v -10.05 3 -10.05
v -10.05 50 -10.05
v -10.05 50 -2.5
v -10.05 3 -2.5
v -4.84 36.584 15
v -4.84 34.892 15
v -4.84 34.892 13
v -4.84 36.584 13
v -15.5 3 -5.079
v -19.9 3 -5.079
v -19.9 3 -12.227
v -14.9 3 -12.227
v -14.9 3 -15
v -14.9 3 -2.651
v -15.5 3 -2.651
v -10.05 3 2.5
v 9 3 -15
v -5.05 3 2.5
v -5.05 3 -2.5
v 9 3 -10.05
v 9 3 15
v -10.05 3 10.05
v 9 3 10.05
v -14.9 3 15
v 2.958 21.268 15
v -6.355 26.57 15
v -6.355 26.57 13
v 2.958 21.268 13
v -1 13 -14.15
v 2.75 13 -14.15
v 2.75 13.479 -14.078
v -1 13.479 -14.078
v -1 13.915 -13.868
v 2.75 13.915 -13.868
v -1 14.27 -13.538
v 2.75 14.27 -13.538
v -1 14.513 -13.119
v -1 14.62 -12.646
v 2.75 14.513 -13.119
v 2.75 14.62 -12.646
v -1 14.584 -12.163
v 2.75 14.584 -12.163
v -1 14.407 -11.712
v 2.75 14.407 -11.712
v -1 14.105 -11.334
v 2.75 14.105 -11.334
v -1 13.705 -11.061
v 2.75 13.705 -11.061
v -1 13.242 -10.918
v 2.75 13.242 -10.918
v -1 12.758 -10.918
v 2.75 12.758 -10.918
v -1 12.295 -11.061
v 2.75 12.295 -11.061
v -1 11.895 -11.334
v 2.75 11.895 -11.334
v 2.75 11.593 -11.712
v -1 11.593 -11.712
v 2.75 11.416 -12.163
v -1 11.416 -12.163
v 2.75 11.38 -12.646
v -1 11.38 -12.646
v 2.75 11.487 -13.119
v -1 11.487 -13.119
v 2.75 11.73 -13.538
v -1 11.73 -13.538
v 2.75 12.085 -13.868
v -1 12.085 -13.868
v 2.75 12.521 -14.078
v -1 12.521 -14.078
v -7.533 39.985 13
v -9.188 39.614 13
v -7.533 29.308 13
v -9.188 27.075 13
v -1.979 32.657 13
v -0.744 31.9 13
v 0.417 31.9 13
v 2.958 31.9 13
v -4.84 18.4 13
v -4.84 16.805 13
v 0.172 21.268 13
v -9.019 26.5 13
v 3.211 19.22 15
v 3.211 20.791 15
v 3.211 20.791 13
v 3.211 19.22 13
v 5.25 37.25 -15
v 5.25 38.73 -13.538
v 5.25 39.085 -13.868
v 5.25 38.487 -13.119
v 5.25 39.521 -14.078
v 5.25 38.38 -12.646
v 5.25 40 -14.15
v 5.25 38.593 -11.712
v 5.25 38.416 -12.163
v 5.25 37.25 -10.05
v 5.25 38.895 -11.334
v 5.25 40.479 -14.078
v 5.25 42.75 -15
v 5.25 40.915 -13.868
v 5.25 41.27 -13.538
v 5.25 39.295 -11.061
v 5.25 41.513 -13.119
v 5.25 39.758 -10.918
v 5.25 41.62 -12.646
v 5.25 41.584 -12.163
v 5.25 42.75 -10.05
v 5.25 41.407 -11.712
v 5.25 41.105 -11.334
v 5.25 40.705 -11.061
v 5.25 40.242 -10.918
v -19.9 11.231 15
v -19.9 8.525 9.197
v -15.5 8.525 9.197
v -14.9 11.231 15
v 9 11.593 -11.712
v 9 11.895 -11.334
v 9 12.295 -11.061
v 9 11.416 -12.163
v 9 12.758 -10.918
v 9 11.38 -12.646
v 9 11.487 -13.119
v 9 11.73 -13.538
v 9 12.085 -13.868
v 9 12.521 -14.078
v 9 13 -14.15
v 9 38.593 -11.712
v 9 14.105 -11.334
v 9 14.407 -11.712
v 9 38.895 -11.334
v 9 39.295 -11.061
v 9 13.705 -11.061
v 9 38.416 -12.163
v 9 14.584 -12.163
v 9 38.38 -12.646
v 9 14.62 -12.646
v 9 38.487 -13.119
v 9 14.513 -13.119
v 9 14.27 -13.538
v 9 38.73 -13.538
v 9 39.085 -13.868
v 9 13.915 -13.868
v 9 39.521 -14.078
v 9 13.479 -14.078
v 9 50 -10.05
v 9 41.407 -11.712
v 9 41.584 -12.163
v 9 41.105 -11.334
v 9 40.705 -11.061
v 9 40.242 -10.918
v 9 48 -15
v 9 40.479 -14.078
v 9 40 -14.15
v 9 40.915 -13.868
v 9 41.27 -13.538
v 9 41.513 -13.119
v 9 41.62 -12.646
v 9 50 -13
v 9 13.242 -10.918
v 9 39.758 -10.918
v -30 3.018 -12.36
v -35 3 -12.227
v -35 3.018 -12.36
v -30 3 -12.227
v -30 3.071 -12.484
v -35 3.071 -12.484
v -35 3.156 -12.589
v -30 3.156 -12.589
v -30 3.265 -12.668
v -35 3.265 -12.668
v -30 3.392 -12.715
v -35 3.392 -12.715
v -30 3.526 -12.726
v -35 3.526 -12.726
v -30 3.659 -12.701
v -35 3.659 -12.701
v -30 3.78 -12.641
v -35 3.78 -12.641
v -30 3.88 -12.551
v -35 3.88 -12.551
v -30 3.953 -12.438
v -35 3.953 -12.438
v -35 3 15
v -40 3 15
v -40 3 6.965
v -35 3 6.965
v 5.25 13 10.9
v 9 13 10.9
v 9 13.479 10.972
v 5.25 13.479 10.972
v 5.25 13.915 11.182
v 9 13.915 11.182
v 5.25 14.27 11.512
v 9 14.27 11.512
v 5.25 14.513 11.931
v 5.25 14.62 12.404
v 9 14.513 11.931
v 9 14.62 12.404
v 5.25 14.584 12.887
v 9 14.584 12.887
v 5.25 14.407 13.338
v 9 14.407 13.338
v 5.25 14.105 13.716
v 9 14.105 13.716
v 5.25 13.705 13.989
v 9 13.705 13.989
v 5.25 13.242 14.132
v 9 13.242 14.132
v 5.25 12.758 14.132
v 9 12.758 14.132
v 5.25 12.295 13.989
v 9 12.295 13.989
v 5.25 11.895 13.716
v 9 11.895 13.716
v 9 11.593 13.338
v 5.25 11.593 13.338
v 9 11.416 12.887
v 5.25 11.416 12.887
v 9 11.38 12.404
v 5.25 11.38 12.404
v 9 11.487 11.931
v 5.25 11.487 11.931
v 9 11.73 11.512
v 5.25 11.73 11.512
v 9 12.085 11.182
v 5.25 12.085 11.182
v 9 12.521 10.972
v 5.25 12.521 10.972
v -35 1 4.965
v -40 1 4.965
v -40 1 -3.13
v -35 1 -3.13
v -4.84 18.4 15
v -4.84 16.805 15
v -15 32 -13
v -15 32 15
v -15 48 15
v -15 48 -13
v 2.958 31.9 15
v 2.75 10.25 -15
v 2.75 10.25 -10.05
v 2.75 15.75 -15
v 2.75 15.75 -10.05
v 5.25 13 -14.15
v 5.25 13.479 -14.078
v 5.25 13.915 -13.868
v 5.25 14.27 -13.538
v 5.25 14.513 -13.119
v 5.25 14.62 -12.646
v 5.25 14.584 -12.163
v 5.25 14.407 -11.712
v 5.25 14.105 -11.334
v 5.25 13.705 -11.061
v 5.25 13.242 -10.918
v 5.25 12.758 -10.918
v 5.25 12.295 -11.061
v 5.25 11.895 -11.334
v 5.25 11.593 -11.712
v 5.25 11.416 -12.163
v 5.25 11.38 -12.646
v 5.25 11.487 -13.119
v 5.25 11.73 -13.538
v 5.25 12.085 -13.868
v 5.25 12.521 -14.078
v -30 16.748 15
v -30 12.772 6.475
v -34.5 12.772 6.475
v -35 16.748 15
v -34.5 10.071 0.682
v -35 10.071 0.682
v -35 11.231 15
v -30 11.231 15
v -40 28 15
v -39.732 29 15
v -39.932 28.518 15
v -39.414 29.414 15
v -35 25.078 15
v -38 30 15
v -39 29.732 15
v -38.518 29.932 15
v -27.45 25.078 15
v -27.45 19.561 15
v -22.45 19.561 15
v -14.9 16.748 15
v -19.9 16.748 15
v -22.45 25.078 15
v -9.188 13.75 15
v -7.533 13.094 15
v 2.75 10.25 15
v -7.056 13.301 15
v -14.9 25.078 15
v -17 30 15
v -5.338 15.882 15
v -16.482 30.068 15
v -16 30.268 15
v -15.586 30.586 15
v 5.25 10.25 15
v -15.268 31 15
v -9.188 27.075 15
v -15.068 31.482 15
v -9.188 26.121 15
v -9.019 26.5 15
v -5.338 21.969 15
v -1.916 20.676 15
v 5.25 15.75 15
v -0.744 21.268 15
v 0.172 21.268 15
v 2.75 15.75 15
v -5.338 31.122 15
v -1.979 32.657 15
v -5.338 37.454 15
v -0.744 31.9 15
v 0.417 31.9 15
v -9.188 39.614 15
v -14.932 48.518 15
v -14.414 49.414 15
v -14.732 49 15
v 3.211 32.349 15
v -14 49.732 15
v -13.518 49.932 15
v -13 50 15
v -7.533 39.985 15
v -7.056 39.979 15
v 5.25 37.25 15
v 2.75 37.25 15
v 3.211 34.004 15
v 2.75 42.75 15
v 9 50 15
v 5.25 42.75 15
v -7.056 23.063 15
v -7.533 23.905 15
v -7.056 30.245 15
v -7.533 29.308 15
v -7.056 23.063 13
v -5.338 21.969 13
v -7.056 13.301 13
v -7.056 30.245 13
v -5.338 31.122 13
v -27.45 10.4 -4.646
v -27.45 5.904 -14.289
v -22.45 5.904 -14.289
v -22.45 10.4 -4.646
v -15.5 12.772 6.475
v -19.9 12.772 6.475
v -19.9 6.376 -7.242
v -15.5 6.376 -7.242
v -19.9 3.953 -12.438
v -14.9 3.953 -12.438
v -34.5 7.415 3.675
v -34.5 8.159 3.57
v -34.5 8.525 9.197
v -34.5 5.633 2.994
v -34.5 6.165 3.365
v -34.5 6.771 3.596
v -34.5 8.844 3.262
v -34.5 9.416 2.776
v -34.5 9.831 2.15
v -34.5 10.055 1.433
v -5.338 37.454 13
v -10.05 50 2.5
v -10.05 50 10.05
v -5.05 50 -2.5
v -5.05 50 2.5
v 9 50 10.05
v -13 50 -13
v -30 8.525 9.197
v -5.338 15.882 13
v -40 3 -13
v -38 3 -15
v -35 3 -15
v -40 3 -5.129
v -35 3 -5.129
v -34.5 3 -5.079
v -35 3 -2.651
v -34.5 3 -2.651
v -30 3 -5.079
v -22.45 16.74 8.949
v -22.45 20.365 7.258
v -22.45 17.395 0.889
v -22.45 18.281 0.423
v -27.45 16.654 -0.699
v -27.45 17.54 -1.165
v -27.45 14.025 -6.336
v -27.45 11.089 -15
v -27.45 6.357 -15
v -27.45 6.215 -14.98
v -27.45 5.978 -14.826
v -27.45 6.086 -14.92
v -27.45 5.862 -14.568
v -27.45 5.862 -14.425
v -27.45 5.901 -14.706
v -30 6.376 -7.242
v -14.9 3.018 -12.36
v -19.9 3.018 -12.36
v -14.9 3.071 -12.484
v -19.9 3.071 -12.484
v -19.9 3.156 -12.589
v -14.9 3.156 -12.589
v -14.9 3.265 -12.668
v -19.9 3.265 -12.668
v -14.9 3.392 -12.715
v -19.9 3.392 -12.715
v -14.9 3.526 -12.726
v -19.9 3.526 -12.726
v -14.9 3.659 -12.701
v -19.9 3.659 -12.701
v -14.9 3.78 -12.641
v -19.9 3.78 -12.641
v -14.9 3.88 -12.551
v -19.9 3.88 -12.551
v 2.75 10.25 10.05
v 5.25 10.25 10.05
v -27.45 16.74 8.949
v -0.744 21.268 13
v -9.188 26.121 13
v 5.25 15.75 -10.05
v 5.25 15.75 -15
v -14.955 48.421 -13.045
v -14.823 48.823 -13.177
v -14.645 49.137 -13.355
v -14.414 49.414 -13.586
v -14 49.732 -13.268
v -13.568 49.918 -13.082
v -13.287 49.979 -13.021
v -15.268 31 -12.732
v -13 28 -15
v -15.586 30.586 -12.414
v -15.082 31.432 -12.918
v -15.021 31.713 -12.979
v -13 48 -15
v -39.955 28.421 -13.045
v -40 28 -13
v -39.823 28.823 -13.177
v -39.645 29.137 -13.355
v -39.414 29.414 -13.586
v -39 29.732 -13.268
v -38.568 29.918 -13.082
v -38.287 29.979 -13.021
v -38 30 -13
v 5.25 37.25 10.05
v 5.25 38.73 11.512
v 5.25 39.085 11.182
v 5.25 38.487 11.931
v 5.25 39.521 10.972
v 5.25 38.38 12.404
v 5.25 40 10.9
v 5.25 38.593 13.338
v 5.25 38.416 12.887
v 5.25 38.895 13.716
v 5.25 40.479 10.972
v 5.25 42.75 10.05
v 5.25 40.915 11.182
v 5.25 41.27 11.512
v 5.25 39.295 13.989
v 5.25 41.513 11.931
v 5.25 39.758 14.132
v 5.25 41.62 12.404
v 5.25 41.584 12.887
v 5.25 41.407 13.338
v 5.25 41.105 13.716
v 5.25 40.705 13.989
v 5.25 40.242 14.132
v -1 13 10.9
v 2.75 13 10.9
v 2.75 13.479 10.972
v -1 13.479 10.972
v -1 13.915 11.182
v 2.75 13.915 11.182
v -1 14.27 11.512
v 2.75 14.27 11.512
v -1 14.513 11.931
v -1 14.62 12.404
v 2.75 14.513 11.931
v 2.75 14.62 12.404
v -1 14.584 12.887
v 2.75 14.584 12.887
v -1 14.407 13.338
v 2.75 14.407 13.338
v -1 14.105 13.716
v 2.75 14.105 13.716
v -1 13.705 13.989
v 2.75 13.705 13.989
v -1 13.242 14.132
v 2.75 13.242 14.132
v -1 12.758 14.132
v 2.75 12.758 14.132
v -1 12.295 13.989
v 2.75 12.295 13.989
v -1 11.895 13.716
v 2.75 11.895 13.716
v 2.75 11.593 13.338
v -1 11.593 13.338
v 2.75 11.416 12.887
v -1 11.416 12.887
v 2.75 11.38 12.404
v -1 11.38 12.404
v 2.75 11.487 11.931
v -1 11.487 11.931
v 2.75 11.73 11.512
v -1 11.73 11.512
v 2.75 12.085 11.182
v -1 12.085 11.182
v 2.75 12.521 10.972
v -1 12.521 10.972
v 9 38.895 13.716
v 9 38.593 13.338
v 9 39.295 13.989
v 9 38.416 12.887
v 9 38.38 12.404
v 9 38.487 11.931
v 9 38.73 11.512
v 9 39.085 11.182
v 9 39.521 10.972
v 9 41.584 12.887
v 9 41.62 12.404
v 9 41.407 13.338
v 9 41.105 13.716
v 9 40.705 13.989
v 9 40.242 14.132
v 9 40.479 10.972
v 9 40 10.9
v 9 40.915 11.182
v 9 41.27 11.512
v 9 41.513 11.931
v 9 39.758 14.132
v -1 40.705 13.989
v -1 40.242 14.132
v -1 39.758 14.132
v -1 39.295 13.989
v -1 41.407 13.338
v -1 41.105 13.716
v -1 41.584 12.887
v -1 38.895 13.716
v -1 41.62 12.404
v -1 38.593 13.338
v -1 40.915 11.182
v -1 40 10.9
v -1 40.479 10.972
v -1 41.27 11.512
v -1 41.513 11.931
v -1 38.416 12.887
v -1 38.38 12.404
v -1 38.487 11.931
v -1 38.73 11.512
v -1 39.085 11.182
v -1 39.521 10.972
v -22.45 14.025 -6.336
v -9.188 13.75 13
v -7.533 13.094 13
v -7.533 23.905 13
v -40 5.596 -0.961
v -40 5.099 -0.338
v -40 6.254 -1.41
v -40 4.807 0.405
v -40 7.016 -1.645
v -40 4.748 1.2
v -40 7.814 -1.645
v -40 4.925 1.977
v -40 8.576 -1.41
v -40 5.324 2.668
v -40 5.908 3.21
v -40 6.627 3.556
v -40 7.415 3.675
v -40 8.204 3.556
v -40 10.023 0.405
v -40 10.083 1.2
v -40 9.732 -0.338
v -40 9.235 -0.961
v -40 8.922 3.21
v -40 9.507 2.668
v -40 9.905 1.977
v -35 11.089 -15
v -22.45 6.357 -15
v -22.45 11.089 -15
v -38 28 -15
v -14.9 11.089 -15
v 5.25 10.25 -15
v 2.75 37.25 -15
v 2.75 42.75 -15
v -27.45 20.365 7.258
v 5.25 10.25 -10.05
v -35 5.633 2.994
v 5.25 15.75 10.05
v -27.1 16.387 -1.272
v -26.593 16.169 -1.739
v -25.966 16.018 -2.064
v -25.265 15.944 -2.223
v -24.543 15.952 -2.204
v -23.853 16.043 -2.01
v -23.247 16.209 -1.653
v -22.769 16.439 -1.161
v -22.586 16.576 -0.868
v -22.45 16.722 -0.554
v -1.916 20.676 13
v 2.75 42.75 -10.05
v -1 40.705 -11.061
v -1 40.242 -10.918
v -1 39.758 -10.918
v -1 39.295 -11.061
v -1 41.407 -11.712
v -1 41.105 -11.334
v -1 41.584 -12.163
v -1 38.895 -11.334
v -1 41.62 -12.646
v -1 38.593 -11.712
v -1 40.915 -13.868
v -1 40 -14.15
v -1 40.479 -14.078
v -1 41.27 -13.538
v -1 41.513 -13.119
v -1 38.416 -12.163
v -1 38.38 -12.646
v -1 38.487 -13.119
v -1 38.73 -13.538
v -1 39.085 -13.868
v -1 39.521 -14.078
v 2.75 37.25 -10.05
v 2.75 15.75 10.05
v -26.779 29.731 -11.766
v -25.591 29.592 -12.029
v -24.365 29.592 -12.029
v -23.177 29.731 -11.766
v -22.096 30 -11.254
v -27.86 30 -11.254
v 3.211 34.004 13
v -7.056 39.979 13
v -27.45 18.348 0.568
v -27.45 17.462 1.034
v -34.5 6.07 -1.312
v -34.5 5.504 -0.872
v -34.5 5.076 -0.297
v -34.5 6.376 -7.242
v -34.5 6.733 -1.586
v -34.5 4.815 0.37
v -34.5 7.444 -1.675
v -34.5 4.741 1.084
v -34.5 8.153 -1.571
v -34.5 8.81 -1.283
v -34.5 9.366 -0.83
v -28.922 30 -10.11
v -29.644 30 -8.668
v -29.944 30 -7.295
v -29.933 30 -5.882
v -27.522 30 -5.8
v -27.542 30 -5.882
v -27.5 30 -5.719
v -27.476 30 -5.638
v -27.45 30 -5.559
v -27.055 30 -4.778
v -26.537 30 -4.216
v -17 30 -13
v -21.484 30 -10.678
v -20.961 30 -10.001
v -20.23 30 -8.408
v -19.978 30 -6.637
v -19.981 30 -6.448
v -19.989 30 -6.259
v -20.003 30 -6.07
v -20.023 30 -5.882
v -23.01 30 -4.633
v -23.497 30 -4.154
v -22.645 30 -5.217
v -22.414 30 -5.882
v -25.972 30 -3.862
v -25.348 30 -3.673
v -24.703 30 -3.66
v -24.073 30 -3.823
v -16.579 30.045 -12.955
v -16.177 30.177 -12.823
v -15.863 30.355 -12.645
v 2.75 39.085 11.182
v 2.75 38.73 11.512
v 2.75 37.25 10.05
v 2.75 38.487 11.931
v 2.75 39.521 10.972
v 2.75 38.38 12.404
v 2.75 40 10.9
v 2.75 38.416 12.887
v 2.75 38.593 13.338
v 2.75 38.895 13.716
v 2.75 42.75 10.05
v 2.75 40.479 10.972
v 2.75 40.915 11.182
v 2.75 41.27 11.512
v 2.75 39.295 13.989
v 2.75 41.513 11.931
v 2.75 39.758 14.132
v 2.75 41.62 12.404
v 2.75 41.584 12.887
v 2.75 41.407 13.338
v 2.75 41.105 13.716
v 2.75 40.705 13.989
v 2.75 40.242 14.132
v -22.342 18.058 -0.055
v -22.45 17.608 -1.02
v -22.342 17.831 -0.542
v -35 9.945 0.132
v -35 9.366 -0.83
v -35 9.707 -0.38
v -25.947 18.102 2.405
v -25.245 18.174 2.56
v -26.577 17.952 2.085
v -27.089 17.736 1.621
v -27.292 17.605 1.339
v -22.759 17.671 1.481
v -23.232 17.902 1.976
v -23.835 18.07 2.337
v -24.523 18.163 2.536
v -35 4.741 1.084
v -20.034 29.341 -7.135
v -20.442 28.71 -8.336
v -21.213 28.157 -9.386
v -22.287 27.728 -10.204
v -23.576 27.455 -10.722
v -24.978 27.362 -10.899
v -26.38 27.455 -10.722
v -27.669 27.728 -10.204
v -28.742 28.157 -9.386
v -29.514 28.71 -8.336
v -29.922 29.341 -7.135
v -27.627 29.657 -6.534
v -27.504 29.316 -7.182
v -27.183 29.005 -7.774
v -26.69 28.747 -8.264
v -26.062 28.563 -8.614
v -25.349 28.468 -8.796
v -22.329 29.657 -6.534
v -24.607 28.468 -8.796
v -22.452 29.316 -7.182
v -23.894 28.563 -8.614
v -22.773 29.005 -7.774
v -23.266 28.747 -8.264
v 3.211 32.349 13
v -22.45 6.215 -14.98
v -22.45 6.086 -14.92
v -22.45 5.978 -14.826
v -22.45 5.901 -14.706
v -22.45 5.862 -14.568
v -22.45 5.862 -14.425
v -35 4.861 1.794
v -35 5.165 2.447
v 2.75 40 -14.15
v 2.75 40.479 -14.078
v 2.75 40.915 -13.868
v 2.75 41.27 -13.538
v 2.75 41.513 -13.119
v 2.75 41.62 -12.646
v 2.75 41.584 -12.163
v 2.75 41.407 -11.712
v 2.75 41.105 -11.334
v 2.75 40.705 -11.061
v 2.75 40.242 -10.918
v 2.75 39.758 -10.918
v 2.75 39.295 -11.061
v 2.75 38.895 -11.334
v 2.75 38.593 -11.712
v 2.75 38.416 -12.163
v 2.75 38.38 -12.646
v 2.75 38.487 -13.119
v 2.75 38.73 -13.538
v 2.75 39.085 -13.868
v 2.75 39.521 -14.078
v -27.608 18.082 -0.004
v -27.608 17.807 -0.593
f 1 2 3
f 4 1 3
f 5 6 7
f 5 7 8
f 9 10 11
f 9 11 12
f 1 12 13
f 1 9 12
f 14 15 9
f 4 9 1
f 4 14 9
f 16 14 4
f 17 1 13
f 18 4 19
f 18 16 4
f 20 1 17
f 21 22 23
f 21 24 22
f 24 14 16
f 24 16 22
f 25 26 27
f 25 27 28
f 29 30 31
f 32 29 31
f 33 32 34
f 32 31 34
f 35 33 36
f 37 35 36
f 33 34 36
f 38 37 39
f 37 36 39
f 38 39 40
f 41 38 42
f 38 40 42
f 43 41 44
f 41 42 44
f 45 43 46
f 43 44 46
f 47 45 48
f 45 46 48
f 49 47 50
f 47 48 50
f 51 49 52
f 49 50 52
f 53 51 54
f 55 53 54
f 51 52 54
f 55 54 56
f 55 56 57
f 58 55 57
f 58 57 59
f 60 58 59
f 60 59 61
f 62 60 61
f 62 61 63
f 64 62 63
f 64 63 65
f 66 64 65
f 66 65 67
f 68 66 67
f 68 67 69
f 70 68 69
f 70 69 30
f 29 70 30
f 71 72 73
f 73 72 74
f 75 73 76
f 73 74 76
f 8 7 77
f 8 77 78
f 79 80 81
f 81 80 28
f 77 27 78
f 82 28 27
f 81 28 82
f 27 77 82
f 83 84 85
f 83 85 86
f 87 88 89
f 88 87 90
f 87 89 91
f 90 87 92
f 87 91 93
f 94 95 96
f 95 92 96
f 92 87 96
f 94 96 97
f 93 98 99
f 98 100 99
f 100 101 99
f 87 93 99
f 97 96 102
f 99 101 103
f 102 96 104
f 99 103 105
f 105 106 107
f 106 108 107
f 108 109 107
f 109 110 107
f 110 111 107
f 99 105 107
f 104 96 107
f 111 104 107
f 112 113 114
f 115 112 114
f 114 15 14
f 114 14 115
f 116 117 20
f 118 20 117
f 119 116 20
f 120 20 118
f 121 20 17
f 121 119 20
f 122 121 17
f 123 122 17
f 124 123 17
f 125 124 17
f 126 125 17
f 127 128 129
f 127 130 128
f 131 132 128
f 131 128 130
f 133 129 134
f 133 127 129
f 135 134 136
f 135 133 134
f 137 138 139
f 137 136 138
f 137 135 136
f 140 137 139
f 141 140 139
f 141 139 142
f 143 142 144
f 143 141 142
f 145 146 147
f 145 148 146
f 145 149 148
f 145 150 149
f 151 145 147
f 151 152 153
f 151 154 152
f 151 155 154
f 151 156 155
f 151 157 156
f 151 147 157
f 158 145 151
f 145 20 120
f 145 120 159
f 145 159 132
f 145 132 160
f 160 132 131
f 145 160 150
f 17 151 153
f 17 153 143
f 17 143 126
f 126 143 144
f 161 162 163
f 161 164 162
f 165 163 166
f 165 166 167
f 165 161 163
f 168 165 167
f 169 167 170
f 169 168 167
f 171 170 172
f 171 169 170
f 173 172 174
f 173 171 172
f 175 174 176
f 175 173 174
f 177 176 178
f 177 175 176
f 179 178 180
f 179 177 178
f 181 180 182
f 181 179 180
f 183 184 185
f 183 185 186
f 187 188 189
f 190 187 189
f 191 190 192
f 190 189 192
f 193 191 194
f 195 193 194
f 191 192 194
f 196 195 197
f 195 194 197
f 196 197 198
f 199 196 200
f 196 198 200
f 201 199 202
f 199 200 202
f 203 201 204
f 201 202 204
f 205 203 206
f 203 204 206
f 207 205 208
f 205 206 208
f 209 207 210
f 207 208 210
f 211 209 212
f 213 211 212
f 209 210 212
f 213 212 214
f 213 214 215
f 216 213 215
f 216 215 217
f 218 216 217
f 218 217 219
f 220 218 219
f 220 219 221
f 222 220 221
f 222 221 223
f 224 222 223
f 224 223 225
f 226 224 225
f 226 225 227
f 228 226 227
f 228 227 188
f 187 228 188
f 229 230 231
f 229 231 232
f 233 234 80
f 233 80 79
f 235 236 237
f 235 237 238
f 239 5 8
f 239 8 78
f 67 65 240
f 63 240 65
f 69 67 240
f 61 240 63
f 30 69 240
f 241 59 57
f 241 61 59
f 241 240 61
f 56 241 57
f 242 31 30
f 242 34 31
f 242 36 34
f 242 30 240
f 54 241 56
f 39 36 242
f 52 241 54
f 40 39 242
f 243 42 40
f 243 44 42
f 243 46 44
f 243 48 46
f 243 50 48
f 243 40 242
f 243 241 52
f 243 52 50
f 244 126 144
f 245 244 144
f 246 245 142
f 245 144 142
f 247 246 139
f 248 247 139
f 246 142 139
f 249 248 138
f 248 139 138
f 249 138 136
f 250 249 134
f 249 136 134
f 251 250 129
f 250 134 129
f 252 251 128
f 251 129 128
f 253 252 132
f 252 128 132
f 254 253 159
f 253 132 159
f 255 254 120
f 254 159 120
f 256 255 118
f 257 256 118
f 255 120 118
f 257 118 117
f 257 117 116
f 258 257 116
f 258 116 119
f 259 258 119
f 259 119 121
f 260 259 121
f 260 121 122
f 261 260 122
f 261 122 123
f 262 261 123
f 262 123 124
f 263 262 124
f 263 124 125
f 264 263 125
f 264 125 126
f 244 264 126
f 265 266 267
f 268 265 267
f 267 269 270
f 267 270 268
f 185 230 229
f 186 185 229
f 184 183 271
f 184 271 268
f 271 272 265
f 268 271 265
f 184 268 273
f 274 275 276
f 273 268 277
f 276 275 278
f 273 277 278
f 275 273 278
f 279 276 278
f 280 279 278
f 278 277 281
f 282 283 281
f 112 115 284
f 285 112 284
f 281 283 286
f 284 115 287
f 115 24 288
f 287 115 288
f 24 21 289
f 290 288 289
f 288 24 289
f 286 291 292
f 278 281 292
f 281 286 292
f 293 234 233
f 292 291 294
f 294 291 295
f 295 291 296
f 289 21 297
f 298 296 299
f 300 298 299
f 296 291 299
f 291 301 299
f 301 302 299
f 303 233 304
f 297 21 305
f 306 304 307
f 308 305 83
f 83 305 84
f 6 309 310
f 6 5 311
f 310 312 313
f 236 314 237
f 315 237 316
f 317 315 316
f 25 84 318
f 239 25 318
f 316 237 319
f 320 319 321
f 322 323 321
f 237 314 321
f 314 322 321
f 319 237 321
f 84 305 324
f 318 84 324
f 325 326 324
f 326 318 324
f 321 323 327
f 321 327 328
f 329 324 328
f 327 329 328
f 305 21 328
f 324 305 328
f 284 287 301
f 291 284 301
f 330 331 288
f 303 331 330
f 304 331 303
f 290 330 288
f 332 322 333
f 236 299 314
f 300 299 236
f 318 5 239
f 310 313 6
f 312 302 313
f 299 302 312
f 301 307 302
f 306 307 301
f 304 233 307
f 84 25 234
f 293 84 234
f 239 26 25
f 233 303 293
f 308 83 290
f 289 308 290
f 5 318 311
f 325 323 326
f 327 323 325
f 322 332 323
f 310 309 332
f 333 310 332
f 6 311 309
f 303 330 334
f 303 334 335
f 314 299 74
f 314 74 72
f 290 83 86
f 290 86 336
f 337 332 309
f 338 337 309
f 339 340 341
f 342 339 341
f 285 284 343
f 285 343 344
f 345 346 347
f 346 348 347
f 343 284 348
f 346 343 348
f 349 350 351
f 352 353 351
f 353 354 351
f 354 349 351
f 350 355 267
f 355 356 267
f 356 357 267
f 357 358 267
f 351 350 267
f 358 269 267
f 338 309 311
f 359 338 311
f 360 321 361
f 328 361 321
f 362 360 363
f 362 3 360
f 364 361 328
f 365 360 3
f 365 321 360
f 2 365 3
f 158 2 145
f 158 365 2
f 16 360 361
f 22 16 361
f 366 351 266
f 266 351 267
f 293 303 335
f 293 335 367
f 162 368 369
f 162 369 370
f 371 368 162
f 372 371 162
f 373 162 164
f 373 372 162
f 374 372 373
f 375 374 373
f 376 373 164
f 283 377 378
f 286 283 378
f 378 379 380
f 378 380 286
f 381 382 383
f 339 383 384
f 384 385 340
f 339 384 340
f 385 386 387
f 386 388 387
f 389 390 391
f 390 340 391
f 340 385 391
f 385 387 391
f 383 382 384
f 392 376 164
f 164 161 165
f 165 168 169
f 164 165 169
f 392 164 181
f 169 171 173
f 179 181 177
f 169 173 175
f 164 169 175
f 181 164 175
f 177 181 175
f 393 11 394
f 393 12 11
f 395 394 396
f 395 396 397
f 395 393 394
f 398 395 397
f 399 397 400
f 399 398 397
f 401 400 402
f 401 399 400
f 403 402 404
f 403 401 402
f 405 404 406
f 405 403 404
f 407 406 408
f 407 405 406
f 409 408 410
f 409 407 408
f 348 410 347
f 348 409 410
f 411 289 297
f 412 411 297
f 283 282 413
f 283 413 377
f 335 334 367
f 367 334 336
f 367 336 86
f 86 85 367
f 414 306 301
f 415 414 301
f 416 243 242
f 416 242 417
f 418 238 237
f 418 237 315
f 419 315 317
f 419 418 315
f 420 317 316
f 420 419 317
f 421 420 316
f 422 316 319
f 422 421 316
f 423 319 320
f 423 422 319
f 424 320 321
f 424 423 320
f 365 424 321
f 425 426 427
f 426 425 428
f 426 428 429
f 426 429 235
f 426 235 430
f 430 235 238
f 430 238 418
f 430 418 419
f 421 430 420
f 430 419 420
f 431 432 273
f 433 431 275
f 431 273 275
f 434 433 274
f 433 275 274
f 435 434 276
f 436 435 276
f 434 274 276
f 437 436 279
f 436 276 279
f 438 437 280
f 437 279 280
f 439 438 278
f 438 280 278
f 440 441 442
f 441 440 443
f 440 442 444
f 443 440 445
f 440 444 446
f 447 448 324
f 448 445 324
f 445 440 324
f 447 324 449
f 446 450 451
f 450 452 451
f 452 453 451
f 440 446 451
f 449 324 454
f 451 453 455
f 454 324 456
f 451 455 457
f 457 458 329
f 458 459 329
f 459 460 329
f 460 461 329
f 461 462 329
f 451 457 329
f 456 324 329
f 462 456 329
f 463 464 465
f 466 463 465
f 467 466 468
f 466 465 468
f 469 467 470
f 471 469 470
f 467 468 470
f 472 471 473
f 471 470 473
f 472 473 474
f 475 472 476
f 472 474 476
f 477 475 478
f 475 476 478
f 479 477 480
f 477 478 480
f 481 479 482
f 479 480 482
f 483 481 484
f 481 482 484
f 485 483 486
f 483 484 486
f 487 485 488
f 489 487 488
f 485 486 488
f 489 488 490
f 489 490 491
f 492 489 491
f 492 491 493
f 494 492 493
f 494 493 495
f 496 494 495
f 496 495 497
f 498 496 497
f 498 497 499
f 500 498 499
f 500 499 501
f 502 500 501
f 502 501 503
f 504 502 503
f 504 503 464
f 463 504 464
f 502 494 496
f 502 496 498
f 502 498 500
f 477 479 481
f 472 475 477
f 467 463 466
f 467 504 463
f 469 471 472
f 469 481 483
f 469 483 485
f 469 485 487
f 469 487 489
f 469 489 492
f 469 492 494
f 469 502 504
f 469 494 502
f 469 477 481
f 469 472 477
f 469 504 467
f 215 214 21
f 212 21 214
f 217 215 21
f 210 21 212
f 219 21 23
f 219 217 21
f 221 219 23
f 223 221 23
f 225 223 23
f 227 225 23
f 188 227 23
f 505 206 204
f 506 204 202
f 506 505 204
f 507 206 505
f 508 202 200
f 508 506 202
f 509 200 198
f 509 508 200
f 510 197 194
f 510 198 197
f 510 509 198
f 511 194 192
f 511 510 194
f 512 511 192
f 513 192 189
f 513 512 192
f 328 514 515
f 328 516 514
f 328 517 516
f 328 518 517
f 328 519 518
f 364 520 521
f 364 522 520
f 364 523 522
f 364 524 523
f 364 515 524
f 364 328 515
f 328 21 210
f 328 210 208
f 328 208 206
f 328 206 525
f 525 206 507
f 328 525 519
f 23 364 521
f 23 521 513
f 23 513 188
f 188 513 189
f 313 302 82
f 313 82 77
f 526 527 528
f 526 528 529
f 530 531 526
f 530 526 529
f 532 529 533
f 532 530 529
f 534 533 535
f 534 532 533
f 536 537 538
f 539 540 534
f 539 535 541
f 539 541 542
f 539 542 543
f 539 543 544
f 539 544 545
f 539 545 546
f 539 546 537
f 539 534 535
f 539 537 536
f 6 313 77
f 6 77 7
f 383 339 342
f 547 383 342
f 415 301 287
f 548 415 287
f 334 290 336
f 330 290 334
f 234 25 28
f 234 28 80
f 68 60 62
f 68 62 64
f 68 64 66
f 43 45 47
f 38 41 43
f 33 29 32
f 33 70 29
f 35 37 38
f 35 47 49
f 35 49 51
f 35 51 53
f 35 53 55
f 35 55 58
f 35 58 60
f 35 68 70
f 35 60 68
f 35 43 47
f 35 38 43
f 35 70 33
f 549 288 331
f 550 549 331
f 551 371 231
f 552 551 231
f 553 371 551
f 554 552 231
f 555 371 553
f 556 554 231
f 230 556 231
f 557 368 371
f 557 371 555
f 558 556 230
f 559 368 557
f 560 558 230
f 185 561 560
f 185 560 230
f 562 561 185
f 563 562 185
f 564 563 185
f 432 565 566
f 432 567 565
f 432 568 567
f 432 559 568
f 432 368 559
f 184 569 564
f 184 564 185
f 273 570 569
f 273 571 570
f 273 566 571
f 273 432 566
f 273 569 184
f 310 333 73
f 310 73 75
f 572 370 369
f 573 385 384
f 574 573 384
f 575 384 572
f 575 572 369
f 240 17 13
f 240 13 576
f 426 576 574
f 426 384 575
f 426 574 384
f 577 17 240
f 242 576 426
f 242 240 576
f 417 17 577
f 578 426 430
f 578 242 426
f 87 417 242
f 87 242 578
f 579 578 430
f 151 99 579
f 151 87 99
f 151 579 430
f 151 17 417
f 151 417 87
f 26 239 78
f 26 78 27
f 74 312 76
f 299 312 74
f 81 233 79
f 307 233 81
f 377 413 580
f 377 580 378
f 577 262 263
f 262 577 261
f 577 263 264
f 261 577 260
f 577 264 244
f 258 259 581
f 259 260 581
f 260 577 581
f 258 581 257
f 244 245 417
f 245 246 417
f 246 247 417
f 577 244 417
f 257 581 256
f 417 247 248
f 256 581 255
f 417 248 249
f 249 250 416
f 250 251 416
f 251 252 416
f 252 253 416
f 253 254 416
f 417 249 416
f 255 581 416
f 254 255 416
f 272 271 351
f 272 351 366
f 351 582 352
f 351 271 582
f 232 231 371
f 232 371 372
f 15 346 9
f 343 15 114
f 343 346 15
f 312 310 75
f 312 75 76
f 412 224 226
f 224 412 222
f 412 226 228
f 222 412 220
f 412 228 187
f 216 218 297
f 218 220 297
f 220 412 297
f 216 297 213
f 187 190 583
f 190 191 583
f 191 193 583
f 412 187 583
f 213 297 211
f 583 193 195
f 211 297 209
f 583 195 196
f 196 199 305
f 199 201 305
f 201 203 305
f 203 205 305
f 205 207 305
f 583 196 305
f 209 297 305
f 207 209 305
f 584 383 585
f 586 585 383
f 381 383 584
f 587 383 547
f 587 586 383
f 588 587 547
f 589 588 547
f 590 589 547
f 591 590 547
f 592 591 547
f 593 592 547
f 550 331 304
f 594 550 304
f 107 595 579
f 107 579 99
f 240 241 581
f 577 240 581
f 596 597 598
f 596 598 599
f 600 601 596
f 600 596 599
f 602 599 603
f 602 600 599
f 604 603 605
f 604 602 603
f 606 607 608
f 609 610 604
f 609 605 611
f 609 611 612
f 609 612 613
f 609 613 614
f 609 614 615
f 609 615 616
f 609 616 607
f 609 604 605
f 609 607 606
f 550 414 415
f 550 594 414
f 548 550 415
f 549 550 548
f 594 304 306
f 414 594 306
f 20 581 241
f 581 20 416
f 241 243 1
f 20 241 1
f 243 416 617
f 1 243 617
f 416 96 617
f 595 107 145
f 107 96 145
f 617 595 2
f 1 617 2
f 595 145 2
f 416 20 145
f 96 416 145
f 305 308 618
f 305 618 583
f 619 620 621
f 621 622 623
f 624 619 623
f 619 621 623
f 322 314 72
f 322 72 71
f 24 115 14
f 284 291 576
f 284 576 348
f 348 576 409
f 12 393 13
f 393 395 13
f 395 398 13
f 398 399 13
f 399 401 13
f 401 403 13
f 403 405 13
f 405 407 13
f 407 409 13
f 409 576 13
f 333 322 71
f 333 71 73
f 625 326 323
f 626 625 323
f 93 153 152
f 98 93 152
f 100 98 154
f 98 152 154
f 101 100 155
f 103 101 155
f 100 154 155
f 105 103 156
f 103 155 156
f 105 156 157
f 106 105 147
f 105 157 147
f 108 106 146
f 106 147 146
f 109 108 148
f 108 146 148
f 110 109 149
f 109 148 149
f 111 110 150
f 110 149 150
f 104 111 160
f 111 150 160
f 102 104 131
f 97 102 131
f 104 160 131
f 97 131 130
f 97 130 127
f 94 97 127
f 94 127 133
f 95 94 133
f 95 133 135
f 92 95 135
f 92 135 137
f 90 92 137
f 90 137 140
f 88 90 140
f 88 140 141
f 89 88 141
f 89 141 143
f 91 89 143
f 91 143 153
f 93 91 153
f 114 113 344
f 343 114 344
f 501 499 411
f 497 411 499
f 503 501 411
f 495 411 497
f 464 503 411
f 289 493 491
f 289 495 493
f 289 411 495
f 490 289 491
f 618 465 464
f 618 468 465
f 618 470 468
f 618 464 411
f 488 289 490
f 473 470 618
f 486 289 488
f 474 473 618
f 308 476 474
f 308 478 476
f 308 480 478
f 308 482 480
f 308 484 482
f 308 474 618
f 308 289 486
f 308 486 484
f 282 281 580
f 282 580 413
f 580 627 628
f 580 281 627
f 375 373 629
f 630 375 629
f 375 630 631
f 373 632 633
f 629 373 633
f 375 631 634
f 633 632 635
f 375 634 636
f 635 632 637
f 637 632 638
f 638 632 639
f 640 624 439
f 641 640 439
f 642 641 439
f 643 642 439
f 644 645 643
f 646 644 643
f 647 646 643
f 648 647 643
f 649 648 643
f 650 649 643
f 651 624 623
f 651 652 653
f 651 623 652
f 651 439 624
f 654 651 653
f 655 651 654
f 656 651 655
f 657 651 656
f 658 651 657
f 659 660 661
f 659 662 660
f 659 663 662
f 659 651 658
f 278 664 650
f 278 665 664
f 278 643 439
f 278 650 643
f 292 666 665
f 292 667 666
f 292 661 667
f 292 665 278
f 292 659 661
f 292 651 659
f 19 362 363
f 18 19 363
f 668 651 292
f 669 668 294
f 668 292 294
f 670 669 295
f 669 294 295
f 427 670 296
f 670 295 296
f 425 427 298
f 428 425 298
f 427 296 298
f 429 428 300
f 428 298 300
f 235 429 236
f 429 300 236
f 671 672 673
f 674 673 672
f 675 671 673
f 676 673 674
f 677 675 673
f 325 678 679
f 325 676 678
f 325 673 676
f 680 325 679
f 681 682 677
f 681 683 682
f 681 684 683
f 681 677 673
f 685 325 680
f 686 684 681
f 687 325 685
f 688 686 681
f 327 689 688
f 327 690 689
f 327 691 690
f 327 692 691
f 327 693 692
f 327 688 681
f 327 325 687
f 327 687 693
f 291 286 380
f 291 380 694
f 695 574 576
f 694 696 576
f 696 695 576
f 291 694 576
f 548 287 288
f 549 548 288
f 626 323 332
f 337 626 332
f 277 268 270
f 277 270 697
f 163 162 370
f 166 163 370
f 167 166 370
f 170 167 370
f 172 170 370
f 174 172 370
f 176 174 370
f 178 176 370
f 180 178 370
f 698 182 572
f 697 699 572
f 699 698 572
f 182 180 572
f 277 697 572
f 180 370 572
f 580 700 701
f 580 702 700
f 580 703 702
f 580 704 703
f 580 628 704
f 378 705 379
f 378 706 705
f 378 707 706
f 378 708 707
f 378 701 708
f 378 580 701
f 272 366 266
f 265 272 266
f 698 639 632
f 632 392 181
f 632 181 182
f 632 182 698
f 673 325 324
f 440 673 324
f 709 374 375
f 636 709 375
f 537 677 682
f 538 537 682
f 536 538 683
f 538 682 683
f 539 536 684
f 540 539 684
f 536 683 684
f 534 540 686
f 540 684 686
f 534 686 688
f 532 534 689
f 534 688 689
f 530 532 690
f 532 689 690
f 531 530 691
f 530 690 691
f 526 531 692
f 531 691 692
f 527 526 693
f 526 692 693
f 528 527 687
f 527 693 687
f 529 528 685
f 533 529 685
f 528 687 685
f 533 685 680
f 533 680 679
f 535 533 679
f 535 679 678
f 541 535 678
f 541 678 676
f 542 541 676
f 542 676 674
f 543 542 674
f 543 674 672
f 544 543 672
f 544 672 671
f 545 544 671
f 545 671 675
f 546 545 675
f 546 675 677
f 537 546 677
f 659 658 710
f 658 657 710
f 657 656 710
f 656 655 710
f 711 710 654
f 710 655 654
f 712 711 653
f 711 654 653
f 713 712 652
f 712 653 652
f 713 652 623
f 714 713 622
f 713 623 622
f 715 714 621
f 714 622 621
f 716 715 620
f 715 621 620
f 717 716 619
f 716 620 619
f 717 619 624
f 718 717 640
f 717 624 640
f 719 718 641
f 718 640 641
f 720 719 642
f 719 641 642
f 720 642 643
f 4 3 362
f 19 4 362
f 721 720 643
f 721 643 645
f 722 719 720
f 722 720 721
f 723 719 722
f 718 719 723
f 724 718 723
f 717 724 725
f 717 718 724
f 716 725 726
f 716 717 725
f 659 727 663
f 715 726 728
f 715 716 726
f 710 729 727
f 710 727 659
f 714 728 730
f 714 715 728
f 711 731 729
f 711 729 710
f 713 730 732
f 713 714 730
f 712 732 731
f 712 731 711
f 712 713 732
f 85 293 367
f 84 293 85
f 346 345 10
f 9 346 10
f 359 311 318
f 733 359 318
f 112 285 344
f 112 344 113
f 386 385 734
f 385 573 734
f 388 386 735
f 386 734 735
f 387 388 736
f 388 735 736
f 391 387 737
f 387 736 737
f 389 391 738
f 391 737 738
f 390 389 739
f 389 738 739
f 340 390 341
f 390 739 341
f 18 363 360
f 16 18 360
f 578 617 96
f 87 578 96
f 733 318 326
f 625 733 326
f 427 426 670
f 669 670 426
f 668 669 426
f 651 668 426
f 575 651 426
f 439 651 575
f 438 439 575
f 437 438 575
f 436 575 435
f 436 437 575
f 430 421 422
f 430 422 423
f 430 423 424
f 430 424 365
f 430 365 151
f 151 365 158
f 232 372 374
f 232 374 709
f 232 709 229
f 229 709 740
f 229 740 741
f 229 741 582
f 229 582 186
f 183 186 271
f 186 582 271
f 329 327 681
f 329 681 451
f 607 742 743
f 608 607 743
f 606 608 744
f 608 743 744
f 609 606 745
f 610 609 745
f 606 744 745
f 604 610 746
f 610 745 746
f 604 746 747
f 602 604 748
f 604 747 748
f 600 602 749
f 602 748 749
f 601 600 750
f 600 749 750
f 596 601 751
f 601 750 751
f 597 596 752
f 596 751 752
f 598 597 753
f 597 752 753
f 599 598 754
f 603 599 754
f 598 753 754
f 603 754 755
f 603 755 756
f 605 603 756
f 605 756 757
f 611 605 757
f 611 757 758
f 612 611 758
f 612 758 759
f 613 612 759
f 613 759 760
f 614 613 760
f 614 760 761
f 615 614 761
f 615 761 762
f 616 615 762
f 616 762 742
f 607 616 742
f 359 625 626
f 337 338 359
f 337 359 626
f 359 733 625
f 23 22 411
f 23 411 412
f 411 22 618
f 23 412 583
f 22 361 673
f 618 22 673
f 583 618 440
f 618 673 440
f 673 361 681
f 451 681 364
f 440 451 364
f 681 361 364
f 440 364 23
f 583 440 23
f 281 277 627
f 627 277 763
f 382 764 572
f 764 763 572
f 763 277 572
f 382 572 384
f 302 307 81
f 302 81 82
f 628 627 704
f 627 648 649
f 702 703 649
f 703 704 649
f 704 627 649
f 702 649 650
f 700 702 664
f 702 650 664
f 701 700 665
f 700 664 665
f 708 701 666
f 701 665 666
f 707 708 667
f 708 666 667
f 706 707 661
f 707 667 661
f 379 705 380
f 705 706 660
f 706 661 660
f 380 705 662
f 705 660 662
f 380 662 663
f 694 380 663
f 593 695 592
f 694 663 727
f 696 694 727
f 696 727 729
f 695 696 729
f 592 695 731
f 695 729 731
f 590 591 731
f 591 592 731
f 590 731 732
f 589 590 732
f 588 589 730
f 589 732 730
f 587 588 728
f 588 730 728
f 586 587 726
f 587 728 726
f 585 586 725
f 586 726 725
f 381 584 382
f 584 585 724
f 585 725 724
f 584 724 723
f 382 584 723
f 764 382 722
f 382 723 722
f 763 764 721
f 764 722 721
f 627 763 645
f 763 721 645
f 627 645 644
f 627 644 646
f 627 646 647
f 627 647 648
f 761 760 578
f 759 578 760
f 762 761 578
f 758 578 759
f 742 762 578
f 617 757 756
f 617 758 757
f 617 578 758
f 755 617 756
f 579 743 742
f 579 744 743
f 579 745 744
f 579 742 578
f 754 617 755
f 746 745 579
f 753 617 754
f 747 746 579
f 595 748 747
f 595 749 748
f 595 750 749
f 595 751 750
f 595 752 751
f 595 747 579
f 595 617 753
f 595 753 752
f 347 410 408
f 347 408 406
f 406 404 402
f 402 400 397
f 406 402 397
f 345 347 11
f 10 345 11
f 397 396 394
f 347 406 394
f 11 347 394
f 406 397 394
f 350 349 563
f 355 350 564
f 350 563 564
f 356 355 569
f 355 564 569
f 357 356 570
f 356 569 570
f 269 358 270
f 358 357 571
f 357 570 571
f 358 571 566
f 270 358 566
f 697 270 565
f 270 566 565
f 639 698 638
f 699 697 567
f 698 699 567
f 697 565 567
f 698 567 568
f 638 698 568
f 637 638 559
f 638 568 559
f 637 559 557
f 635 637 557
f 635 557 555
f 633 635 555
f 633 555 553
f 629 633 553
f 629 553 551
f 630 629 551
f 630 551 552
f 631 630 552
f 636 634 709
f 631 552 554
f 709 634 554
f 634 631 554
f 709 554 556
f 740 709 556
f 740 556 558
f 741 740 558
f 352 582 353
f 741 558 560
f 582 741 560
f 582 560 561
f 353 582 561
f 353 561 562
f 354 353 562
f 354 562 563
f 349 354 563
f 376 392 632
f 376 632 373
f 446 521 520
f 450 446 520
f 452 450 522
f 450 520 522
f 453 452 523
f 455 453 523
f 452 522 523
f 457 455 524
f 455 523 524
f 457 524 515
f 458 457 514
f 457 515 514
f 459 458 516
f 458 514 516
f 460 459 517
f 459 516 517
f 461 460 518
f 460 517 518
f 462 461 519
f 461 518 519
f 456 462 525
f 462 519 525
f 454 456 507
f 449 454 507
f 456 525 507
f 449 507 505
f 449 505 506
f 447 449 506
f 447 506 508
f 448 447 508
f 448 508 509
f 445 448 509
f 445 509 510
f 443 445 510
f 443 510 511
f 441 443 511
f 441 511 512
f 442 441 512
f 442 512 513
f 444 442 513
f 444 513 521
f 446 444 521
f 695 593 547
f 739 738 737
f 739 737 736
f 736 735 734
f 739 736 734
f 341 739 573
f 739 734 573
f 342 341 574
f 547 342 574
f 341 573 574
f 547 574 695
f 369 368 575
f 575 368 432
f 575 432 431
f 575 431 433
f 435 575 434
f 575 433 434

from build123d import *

# Parameters (mm, degrees)
SKETCH1_W                       = 30
SKETCH1_H                       = 30
BOSS_EXTRUDE1_DEPTH             = 50
CUT_EXTRUDE1_DEPTH              = 55.313902456
SKETCH3_W                       = 6
SKETCH3_H                       = 30
CUT_EXTRUDE2_DEPTH              = 55.313902456
SKETCH5_W                       = 30
SKETCH5_H                       = 30
BOSS_EXTRUDE2_DEPTH             = 25
F_45_DEGREE_EXTRUSION_CUT_DEPTH = 73.926037689
SKETCH11_R                      = 1.625
CUT_EXTRUDE7_DEPTH              = 10
CHAMFER1_SIZE                   = 2
FILLET1_R                       = 2
SKETCH16_R                      = 2.675
CUT_EXTRUDE10_DEPTH             = 10
CUT_EXTRUDE11_DEPTH             = 9.5
FILLET2_R                       = 0.5
FILLET3_R                       = 0.5
SKETCH19_W                      = 49
SKETCH19_H                      = 3
CUT_EXTRUDE12_DEPTH             = 71.710678119
SKETCH20_W                      = 6.753728314
SKETCH20_H                      = 6.253099935
CUT_EXTRUDE13_DEPTH             = 15
SKETCH22_R                      = 2.65
CUT_EXTRUDE14_DEPTH             = 51.035604398
SKETCH23_R                      = 5
CUT_EXTRUDE15_DEPTH             = 2.5
SKETCH24_W                      = 5
SKETCH24_H                      = 15
CUT_EXTRUDE16_DEPTH             = 4
SKETCH25_W                      = 5
SKETCH25_H                      = 12.094379765
BOSS_EXTRUDE3_DEPTH             = 2
CHAMFER2_SIZE                   = 2
SKETCH26_W                      = 2.5
SKETCH26_H                      = 5.5
CUT_EXTRUDE17_DEPTH             = 71.710678119
FILLET4_R                       = 0.5
CUT_EXTRUDE18_DEPTH             = 2


with BuildPart() as part:
    # Sketch1 → Boss-Extrude1 (new body)
    with BuildSketch(Plane(origin=(0, 0, 0), x_dir=(1, 0, 0), z_dir=(0, 1, 0))):
        Rectangle(SKETCH1_W, SKETCH1_H)
    extrude(amount=BOSS_EXTRUDE1_DEPTH)

    # Sketch2 → Cut-Extrude1 (cut, through all)
    with BuildSketch(Plane(origin=(0, 50, 0), x_dir=(1, 0, 0), z_dir=(0, 1, 0))):
        Polygon((-10.05, -2.5), (-10.05, -10.05), (10.05, -10.05), (10.05, 10.05), (-10.05, 10.05), (-10.05, 2.5), (-5.05, 2.5), (-5.05, -2.5), align=None)
    extrude(amount=-CUT_EXTRUDE1_DEPTH, mode=Mode.SUBTRACT)

    # Sketch3 → Cut-Extrude2 (cut, through all)
    with BuildSketch(Plane(origin=(0, 50, 0), x_dir=(1, 0, 0), z_dir=(0, 1, 0))):
        with Locations((12, 0)):
            Rectangle(SKETCH3_W, SKETCH3_H)
    extrude(amount=-CUT_EXTRUDE2_DEPTH, mode=Mode.SUBTRACT)

    # Sketch5 → Boss-Extrude2 (add)
    with BuildSketch(Plane.ZY.offset(15)):
        with Locations((0, 15)):
            Rectangle(SKETCH5_W, SKETCH5_H)
    extrude(amount=BOSS_EXTRUDE2_DEPTH)

    # Sketch7 → 45 degree extrusion cut (cut, through all)
    with BuildSketch(Plane(origin=(-40, 12.069825676, -23.451382923), x_dir=(-1, 0, 0), z_dir=(0, -0.42261826174069717, -0.9063077870366509))):
        Polygon((-25.1, -17.010685759), (-25.1, -24.560685759), (-17.55, -24.560685759), (-17.55, -19.560685759), (-12.55, -19.560685759), (-12.55, -24.560685759), (-5, -24.560685759), (-5, -17.010685759), (-10, -17.010685759), (-10, -14.510685759), (-20.1, -14.510685759), (-20.1, -17.010685759), align=None)
        Polygon((-25.1, -4.460685759), (-25.1, -12.010685759), (-20.1, -12.010685759), (-20.1, -14.510685759), (-10, -14.510685759), (-10, -12.010685759), (-5, -12.010685759), (-5, -4.460685759), (-12.55, -4.460685759), (-12.55, -9.460685759), (-17.55, -9.460685759), (-17.55, -4.460685759), align=None)
    extrude(amount=-F_45_DEGREE_EXTRUSION_CUT_DEPTH, mode=Mode.SUBTRACT)

    # Sketch11 → Cut-Extrude7 (cut)
    with BuildSketch(Plane(origin=(9, 0, 0), x_dir=(0, 0, -1), z_dir=(1, 0, 0))):
        with Locations((-12.525, 40)):
            Circle(SKETCH11_R)
        with Locations((12.525, 40)):
            Circle(SKETCH11_R)
        with Locations((12.525, 13)):
            Circle(SKETCH11_R)
        with Locations((-12.525, 13)):
            Circle(SKETCH11_R)
    extrude(amount=-CUT_EXTRUDE7_DEPTH, mode=Mode.SUBTRACT)

    # Chamfer1
    chamfer1_edges = [part.edges().sort_by_distance(p)[0] for p in [
        (-5.45, 0, -15),
        (-3, 50, -15),
        (-27.5, 30, -15),
        (-40, 15, -15),
        (-15, 40, -15),
        (-35, 0, -15),
    ]]
    chamfer(chamfer1_edges, length=CHAMFER1_SIZE)

    # Fillet1
    fillet1_edges = [part.edges().sort_by_distance(p)[0] for p in [
        (-15, 50, 1),
        (-15, 30, 1),
        (-40, 30, 1),
        (-40, 0, 1),
    ]]
    fillet(fillet1_edges, radius=FILLET1_R)

    # Sketch16 → Cut-Extrude10 (cut)
    with BuildSketch(Plane.ZY.offset(40)):
        with Locations((1, 7.415122828)):
            Circle(SKETCH16_R)
    extrude(amount=-CUT_EXTRUDE10_DEPTH, mode=Mode.SUBTRACT)

    # Sketch18 → Cut-Extrude11 (cut, symmetric)
    with BuildSketch(Plane.ZY.offset(25)):
        Polygon((9.950685103, 7.347750191), (5.606439218, 14.127716409), (-7.950685103, 7.482495466), (-3.606439218, 0.702529248), align=None)
    extrude(amount=CUT_EXTRUDE11_DEPTH, both=True, mode=Mode.SUBTRACT)

    # Fillet2
    fillet2_edges = [part.edges().sort_by_distance(p)[0] for p in [
        (-24.95, 0, -3.050682005),
    ]]
    fillet(fillet2_edges, radius=FILLET2_R)

    # Fillet3
    fillet3_edges = [part.edges().sort_by_distance(p)[0] for p in [
        (-24.95, 8.417171254, 15),
    ]]
    fillet(fillet3_edges, radius=FILLET3_R)

    # Sketch19 → Cut-Extrude12 (cut, through all)
    with BuildSketch(Plane.XY.offset(15)):
        with Locations((-15.5, 1.5)):
            Rectangle(SKETCH19_W, SKETCH19_H)
    extrude(amount=-CUT_EXTRUDE12_DEPTH, mode=Mode.SUBTRACT)


with BuildPart() as cut_extrude12_piece_1:
    # of the separate pieces the step leaves, piece 1, a body of its own (cut_extrude12_pieces)
    add(part.part.solids().sort_by_distance((-14.9, 3, 15))[0])

    # Sketch22 → Cut-Extrude14 (cut, through all)
    with BuildSketch(Plane(origin=(-25, 31.908299393, -7.624586929), x_dir=(1, 0, 0), z_dir=(3.142436568436473e-15, 0.8851034809979968, -0.46539427147874146))):
        with Locations(Location((0.022023463, 0.014340274, 0), (0, 0, 201.118214674))):
            Circle(SKETCH22_R)
    extrude(amount=-CUT_EXTRUDE14_DEPTH, mode=Mode.SUBTRACT)

    # Sketch23 → Cut-Extrude15 (cut)
    with BuildSketch(Plane(origin=(-25, 31.908299393, -7.624586929), x_dir=(1, 0, 0), z_dir=(3.142436568436473e-15, 0.8851034809979968, -0.46539427147874146))):
        with Locations((0.022023463, 0.014340274)):
            Circle(SKETCH23_R)
    extrude(amount=-CUT_EXTRUDE15_DEPTH, mode=Mode.SUBTRACT)

    # Sketch24 → Cut-Extrude16 (cut)
    with BuildSketch(Plane(origin=(0, 10.322187648, -4.813315149), x_dir=(1, 0, 0), z_dir=(0, -0.906307787036651, 0.4226182617406971))):
        with Locations((-24.95, 7.684747226)):
            Rectangle(SKETCH24_W, SKETCH24_H)
    extrude(amount=-CUT_EXTRUDE16_DEPTH, mode=Mode.SUBTRACT)

    # Sketch25 → Boss-Extrude3 (add)
    with BuildSketch(Plane.XZ.offset(-3)):
        with Locations((-37.5, 0.91772931)):
            Rectangle(SKETCH25_W, SKETCH25_H)
    extrude(amount=BOSS_EXTRUDE3_DEPTH)

    # Chamfer2
    chamfer2_edges = [cut_extrude12_piece_1.edges().sort_by_distance(p)[0] for p in [
        (-37.5, 1, -5.129460572),
        (-37.5, 1, 6.964919193),
    ]]
    chamfer(chamfer2_edges, length=CHAMFER2_SIZE - 0.0001)  # a hair under: the kernel refuses the full size

    # Sketch26 → Cut-Extrude17 (cut, through all)
    with BuildSketch(Plane.XY.offset(15)):
        with Locations((4, 40)):
            Rectangle(SKETCH26_W, SKETCH26_H)
        with Locations((4, 13)):
            Rectangle(SKETCH26_W, SKETCH26_H)
    extrude(amount=-CUT_EXTRUDE17_DEPTH, mode=Mode.SUBTRACT)

    # Fillet4
    fillet4_edges = [cut_extrude12_piece_1.edges().sort_by_distance(p)[0] for p in [
        (-32.5, 3, -14.481983196),
        (-24.95, 5.572058491, -15),
        (-17.4, 3, -14.481983196),
    ]]
    fillet(fillet4_edges, radius=FILLET4_R)

    # Mobious Logo → Cut-Extrude18 (cut)
    with BuildSketch(Plane(origin=(0, 0, 15), x_dir=(-1, 0, 0), z_dir=(0, 0, 1))):
        Polygon((-3.210868628, -32.348650408), (-3.210868628, -34.003716414), (7.056151005, -39.978785217), (7.056151005, -30.244752942), (5.33825141, -31.122174097), (5.33825141, -37.454108258), align=None)
        Polygon((1.978745121, -32.657222036), (0.744458608, -31.899818949), (9.188100437, -27.07488076), (9.188100437, -39.614109657), (7.533034431, -39.985072727), (7.533034431, -29.307901849), align=None)
        Polygon((4.840045674, -36.584497306), (-2.958400932, -31.899818949), (6.355467669, -26.569945368), (-2.958400932, -21.268123754), (4.840045674, -16.805452407), (4.840045674, -18.400245934), (-0.171524822, -21.268123754), (9.019468658, -26.5), (-0.416628352, -31.899818949), (4.840045674, -34.892125279), align=None)
        Polygon((-3.210868628, -20.791240329), (-3.210868628, -19.220330221), (7.056151005, -13.30136535), (7.056151005, -23.063449592), (5.33825141, -21.96942291), (5.33825141, -15.882146242), align=None)
        Polygon((0.744458608, -21.268123754), (9.188100437, -26.121113909), (9.188100437, -13.75019681), (7.533034431, -13.093877531), (7.533034431, -23.905008578), (1.915732347, -20.67645954), align=None)
    extrude(amount=-CUT_EXTRUDE18_DEPTH, mode=Mode.SUBTRACT)


with BuildPart() as cut_extrude12_piece_2:
    # of the separate pieces the step leaves, piece 2, a body of its own (cut_extrude12_pieces)
    add(part.part.solids().sort_by_distance((-27.45, 3, 15))[0])

    # Sketch20 → Cut-Extrude13 (cut)
    with BuildSketch(Plane.XY.offset(15)):
        with Locations((-25.201643275, 5.301831254)):
            Rectangle(SKETCH20_W, SKETCH20_H)
    extrude(amount=-CUT_EXTRUDE13_DEPTH, mode=Mode.SUBTRACT)


solid = cut_extrude12_piece_1.part
